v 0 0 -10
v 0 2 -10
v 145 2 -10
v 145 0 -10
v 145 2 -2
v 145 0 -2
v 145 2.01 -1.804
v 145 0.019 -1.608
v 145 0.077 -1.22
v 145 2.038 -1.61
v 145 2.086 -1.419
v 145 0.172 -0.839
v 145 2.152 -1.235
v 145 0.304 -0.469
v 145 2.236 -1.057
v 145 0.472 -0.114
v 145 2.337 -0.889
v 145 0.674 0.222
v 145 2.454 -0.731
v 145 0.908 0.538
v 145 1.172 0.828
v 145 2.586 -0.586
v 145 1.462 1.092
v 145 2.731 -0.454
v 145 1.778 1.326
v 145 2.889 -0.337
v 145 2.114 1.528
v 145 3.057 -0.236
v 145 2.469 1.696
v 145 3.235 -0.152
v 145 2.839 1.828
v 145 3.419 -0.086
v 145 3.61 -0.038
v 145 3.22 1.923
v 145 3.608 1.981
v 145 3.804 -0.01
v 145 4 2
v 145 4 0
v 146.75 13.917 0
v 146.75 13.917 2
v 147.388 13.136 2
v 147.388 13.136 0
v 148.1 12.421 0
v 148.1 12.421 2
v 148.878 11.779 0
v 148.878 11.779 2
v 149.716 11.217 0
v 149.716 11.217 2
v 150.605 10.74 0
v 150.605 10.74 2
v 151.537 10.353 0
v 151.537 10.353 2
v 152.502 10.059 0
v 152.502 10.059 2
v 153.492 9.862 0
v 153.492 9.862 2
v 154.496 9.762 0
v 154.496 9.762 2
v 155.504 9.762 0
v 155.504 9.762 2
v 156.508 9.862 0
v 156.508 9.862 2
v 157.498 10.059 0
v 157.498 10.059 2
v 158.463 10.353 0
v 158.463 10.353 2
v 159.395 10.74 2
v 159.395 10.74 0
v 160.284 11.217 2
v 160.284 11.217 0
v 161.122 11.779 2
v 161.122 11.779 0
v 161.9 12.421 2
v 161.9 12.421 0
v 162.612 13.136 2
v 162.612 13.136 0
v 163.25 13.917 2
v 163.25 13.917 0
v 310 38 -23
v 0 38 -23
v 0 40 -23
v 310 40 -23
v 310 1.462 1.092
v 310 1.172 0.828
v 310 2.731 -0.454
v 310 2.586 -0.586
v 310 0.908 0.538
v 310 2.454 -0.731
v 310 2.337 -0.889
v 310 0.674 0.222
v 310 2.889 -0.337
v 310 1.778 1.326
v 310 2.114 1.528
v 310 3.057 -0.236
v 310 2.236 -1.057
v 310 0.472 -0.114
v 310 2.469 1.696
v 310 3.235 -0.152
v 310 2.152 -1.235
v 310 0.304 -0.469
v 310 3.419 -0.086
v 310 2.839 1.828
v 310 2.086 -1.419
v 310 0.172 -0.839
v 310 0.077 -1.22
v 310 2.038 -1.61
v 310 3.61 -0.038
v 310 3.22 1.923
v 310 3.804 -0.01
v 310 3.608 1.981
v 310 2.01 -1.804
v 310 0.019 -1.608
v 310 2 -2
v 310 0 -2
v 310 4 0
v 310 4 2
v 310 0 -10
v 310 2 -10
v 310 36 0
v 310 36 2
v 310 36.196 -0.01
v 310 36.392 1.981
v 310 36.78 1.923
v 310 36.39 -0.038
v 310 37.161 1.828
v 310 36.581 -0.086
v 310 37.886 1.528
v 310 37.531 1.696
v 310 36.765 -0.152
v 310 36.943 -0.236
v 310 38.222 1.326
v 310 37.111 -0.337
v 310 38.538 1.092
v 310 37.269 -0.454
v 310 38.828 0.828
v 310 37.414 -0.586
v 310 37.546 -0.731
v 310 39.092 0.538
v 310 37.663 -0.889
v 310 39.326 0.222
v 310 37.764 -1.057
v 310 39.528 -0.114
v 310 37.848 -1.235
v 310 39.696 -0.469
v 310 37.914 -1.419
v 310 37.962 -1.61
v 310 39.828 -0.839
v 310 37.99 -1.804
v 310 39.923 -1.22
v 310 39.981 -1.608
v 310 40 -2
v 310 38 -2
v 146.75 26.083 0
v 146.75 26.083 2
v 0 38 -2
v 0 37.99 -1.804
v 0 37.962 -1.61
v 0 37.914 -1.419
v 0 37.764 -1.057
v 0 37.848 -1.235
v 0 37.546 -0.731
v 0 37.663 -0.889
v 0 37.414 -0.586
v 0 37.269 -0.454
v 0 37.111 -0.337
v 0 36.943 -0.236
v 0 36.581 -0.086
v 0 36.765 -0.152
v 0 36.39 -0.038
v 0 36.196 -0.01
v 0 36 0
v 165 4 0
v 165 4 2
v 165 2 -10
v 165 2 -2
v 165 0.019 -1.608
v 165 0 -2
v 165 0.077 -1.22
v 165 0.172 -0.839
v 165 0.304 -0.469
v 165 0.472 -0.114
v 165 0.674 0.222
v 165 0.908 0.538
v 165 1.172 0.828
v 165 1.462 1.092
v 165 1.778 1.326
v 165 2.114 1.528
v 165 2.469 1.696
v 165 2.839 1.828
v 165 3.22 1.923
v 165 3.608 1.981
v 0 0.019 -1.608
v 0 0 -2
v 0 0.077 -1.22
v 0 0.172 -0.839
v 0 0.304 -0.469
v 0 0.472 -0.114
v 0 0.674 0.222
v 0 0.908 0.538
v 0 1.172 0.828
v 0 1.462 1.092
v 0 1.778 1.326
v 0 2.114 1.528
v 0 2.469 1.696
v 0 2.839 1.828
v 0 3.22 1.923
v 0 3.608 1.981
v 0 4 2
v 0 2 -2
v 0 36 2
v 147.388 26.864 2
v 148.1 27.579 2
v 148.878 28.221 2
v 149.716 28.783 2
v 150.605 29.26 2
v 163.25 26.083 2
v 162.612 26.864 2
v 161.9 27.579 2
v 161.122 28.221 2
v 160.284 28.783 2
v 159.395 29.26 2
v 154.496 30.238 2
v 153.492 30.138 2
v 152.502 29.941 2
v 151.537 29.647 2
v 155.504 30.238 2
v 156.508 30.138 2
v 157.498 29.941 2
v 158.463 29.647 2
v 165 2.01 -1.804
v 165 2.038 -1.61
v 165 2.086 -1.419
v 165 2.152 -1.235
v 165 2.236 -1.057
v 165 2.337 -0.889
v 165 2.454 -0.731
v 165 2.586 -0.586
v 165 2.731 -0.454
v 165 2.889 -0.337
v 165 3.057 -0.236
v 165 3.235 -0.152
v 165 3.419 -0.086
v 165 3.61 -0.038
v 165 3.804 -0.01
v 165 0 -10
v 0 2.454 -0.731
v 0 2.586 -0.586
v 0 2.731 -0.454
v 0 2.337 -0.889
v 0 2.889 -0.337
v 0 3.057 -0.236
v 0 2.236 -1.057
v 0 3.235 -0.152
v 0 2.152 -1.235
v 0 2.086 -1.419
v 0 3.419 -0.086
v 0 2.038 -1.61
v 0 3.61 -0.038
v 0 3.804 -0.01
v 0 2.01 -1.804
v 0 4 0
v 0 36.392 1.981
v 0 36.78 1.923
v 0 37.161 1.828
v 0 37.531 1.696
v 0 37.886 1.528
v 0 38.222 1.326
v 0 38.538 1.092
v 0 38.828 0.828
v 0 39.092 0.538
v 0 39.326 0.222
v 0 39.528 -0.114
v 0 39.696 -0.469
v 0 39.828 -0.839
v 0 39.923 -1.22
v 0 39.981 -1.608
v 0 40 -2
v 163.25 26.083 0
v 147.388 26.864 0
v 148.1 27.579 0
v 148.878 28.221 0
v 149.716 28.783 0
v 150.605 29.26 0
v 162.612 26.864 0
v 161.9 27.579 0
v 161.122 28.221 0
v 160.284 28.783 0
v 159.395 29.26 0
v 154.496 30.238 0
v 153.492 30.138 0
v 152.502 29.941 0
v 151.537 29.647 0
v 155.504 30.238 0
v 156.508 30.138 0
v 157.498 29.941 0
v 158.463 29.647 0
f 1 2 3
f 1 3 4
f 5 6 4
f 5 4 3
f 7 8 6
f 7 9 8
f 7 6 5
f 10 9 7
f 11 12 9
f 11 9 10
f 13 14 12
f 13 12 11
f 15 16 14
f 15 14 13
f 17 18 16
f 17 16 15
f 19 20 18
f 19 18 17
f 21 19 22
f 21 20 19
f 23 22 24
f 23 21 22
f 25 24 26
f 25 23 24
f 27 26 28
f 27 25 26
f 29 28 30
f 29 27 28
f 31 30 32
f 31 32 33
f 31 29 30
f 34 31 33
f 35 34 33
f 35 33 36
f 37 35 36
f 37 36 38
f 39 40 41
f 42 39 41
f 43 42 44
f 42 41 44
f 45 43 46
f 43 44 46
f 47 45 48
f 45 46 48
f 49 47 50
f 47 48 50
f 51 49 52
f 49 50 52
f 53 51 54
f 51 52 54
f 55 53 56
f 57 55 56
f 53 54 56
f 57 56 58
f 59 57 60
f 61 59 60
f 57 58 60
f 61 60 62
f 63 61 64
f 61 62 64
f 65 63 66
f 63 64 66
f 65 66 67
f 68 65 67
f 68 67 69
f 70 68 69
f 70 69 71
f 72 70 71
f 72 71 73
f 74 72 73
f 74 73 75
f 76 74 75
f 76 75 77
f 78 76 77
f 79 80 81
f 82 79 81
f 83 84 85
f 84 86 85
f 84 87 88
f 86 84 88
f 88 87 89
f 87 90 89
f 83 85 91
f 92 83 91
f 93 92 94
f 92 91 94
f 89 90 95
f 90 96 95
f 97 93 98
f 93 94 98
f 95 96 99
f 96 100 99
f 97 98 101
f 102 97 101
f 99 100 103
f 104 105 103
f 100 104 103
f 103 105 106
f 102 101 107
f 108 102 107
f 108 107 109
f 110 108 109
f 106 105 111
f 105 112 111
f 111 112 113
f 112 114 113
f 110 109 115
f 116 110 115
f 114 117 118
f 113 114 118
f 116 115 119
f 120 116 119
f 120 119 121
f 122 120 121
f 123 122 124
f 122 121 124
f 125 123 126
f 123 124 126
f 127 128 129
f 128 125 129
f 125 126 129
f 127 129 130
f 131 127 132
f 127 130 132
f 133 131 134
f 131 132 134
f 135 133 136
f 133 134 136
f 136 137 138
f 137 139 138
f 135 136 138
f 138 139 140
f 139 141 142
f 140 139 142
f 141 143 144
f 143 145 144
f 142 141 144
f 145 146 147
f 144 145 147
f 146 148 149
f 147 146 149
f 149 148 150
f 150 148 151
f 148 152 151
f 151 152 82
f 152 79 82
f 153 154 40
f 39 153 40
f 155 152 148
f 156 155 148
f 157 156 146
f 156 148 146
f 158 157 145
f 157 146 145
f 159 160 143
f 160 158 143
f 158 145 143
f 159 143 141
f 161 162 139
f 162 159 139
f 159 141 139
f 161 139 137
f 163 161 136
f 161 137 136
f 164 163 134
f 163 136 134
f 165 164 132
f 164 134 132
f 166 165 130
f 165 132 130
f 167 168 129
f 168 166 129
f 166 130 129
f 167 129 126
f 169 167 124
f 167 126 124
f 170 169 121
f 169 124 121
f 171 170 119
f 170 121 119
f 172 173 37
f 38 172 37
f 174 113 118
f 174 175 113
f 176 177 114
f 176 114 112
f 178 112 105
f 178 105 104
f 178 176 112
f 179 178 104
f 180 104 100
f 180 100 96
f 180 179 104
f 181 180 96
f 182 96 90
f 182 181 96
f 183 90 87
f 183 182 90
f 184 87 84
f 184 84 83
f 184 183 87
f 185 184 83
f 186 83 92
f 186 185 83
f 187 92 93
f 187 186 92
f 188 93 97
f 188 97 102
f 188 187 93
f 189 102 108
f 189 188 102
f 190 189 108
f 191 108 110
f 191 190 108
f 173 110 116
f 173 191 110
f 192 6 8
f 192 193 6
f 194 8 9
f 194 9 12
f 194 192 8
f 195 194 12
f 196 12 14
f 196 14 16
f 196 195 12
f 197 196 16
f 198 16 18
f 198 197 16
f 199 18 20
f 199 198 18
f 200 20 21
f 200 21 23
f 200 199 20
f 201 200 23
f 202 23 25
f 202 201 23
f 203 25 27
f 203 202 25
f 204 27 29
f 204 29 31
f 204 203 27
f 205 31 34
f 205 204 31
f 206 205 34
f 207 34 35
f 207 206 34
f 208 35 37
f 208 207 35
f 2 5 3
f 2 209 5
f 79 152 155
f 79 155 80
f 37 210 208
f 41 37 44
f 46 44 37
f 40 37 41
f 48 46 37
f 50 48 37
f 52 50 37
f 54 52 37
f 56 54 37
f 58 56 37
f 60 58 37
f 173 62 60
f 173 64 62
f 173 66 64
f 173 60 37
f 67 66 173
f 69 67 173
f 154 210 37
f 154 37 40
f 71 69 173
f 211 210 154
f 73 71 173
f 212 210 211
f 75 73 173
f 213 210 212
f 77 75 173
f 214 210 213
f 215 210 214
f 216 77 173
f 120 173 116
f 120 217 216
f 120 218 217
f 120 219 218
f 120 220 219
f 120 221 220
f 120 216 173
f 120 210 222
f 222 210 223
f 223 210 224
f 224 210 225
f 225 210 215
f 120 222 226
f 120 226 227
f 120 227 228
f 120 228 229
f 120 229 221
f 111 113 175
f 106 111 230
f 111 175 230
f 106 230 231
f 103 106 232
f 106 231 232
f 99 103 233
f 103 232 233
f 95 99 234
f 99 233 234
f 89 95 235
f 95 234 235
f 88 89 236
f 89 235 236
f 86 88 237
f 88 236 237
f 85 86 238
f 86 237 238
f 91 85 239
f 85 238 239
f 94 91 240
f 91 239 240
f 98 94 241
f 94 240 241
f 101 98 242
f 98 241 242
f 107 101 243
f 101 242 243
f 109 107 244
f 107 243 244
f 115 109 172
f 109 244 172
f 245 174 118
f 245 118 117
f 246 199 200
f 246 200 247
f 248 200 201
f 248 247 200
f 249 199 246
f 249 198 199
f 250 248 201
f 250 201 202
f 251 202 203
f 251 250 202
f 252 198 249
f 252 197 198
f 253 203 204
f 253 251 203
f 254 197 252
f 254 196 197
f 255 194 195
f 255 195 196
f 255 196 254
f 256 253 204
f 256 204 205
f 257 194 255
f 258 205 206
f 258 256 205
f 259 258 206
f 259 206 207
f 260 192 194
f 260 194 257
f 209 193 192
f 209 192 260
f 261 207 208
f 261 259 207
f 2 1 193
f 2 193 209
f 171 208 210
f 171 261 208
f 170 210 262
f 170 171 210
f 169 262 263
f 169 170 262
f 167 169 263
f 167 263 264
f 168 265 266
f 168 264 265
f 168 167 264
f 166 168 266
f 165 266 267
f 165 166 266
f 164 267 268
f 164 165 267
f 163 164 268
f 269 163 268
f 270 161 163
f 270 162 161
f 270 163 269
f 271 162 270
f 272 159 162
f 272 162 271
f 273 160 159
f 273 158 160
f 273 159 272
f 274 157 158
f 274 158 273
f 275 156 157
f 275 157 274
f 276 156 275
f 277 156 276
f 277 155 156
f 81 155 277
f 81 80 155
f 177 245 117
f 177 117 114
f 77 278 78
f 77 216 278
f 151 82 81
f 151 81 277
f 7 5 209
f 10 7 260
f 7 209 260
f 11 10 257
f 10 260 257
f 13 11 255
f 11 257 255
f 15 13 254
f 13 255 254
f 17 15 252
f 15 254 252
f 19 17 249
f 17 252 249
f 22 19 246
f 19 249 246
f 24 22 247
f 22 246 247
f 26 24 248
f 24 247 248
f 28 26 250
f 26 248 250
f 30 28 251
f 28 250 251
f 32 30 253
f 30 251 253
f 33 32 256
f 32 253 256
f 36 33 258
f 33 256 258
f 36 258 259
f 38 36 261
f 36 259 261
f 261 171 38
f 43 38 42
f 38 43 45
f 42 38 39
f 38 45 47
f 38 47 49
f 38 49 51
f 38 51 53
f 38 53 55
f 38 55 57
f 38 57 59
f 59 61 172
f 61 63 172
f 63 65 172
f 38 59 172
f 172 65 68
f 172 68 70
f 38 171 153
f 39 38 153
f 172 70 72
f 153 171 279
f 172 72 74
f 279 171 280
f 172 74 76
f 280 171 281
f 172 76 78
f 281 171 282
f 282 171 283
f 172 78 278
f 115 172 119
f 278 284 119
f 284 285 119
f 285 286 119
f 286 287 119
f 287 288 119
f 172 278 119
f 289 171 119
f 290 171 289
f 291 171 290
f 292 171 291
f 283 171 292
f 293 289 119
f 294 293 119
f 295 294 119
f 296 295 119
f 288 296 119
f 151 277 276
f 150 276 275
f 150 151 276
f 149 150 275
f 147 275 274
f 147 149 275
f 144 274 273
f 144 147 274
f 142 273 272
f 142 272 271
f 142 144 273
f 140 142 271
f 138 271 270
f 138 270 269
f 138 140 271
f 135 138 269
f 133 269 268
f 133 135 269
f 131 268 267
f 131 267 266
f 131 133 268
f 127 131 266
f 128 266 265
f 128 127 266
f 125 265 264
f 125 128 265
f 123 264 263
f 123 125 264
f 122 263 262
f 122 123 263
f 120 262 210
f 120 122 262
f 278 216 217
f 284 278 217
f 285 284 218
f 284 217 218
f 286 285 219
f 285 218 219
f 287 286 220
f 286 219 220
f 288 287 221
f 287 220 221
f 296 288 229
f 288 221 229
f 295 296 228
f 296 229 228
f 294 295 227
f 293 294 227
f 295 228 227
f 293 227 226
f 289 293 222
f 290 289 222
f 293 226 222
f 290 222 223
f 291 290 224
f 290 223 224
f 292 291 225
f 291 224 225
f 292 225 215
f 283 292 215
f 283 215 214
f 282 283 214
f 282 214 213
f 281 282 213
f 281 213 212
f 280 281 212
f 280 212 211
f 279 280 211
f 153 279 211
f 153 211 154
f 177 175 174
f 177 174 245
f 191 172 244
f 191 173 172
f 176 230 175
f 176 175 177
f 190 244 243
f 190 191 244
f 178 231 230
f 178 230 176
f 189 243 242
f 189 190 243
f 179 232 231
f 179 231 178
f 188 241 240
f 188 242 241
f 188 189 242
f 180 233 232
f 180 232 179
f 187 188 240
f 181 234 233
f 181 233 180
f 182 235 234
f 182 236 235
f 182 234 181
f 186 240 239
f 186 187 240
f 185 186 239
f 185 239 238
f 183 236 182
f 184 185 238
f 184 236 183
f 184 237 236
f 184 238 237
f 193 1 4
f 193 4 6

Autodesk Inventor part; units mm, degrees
ref_plane "YZ Plane" through (0, 0, 0) normal (1, 0, 0) x (0, 1, 0)
ref_plane "XZ Plane" through (0, 0, 0) normal (0, 1, 0) x (-1, 0, 0)
ref_plane "XY Plane" through (0, 0, 0) normal (0, 0, 1) x (1, 0, 0)
sketch "Sketch1" plane through (0, 0, 0) normal (0, 0, 1) x (1, 0, 0)
  line L0 (0, 0) -> (310, 0)
  line L1 (310, 0) -> (310, 40)
  line L2 (310, 40) -> (0, 40)
  line L3 (0, 40) -> (0, 0)
  dimension "d1" = 40
  dimension "d2" = 310
extrude "Plate1" add sketch "Sketch1" along normal blind 2
sketch "Sketch2" plane through (310, 38, 2) normal (0, 1, 0) x (-1, 0, 0)
  line L0 (310, 0) -> (0, 0)
  line L1 (0, 0) -> (0, -25)
  line L2 (0, -25) -> (310, -25)
  line L3 (310, -25) -> (310, 0)
edge flange "Flange1" height 25 angle 90 thickness 2 bend radius 2 thickness toward (0, 1, 0) relief tear relief width 2 relief depth 1 edges at (155, 40, 0) wall of the first edge with corners at (0, 38, 2) (310, 38, 2) (310, 38, -23) (0, 38, -23)
bend "Bend1"
corner "Corner1"
sketch "Sketch3" plane through (0, 2, 2) normal (0, -1, 0) x (1, 0, 0)
  line L0 (310, 0) -> (0, 0)
  line L1 (0, 0) -> (0, -12)
  line L2 (0, -12) -> (310, -12)
  line L3 (310, -12) -> (310, 0)
edge flange "Flange2" height 12 angle 90 thickness 2 bend radius 2 thickness toward (0, -1, 0) relief tear relief width 2 relief depth 1 edges at (155, 0, 0) wall of the first edge with corners at (310, 2, 2) (0, 2, 2) (0, 2, -10) (310, 2, -10)
bend "Bend2"
corner "Corner2"
sketch "Sketch4" plane through (0, 0, 2) normal (0, 0, 1) x (1, 0, 0)
  arc A0 (146.75, 13.9172) -> (163.25, 13.9172) centre (155, 20) ccw
  line L0 (0, 4) -> (0, 36) projected
  line L1 (0, 40) -> (310, 40) projected
  line L2 (146.75, 26.0828) -> (146.75, 13.9172)
  line L3 (163.25, 26.0828) -> (163.25, 13.9172)
  arc A1 (146.75, 26.0828) -> (146.75, 13.9172) centre (155, 20) ccw construction
  arc A2 (163.25, 26.0828) -> (146.75, 26.0828) centre (155, 20) ccw
  arc A3 (163.25, 13.9172) -> (163.25, 26.0828) centre (155, 20) ccw construction
  point P0 (0, 0)
  point P1 (0, 20)
  point P2 (155, 40)
  dimension "d25" = 20.5
  dimension "d26" = 16.5
extrude "Cut1" cut sketch "Sketch4" against normal blind 2
sketch "Sketch5" plane through (0, 0, 2) normal (0, 0, 1) x (1, 0, 0)
  line L0 (310, 4) -> (0, 4) projected
  line L1 (145, 4) -> (165, 4)
  line L2 (165, 4) -> (165, -2)
  line L3 (165, -2) -> (145, -2)
  line L4 (145, -2) -> (145, 4)
  point P0 (0, 0)
  point P1 (155, -2)
  point P2 (155, 4)
  dimension "d27" = 20
  dimension "d28" = 6
extrude "Cut2" cut sketch "Sketch5" against normal through all
equation "\"d23\" = Thickness"
equation "\"d29\" = Thickness"
equation "\"d3\" = BendReliefWidth"
equation "\"d4\" = BendReliefDepth"
equation "\"d5\" = MinimumRemnant"
equation "\"d6\" = BendRadius"
equation "\"d9\" = BendRadius"
equation "\"d10\" = CornerReliefSize"
equation "\"d11\" = GapSize"
equation "\"d12\" = JacobiRadiusSize"
equation "\"d13\" = BendReliefWidth"
equation "\"d14\" = BendReliefDepth"
equation "\"d15\" = MinimumRemnant"
equation "\"d16\" = BendRadius"
equation "\"d19\" = BendRadius"
equation "\"d20\" = CornerReliefSize"
equation "\"d21\" = GapSize"
equation "\"d22\" = JacobiRadiusSize"
equation "\"BendRadius\" = Thickness"
equation "\"BendReliefWidth\" = Thickness"
equation "\"BendReliefDepth\" = 0.5 * Thickness"
equation "\"CornerReliefSize\" = 4 * Thickness"
equation "\"MinimumRemnant\" = 2 * Thickness"
equation "\"TransitionRadius\" = BendRadius"
equation "\"JacobiRadiusSize\" = BendRadius"
equation "\"GapSize\" = Thickness"
equation "\"d0\" = BendRadius"
equation "\"Thickness\" = 2"
